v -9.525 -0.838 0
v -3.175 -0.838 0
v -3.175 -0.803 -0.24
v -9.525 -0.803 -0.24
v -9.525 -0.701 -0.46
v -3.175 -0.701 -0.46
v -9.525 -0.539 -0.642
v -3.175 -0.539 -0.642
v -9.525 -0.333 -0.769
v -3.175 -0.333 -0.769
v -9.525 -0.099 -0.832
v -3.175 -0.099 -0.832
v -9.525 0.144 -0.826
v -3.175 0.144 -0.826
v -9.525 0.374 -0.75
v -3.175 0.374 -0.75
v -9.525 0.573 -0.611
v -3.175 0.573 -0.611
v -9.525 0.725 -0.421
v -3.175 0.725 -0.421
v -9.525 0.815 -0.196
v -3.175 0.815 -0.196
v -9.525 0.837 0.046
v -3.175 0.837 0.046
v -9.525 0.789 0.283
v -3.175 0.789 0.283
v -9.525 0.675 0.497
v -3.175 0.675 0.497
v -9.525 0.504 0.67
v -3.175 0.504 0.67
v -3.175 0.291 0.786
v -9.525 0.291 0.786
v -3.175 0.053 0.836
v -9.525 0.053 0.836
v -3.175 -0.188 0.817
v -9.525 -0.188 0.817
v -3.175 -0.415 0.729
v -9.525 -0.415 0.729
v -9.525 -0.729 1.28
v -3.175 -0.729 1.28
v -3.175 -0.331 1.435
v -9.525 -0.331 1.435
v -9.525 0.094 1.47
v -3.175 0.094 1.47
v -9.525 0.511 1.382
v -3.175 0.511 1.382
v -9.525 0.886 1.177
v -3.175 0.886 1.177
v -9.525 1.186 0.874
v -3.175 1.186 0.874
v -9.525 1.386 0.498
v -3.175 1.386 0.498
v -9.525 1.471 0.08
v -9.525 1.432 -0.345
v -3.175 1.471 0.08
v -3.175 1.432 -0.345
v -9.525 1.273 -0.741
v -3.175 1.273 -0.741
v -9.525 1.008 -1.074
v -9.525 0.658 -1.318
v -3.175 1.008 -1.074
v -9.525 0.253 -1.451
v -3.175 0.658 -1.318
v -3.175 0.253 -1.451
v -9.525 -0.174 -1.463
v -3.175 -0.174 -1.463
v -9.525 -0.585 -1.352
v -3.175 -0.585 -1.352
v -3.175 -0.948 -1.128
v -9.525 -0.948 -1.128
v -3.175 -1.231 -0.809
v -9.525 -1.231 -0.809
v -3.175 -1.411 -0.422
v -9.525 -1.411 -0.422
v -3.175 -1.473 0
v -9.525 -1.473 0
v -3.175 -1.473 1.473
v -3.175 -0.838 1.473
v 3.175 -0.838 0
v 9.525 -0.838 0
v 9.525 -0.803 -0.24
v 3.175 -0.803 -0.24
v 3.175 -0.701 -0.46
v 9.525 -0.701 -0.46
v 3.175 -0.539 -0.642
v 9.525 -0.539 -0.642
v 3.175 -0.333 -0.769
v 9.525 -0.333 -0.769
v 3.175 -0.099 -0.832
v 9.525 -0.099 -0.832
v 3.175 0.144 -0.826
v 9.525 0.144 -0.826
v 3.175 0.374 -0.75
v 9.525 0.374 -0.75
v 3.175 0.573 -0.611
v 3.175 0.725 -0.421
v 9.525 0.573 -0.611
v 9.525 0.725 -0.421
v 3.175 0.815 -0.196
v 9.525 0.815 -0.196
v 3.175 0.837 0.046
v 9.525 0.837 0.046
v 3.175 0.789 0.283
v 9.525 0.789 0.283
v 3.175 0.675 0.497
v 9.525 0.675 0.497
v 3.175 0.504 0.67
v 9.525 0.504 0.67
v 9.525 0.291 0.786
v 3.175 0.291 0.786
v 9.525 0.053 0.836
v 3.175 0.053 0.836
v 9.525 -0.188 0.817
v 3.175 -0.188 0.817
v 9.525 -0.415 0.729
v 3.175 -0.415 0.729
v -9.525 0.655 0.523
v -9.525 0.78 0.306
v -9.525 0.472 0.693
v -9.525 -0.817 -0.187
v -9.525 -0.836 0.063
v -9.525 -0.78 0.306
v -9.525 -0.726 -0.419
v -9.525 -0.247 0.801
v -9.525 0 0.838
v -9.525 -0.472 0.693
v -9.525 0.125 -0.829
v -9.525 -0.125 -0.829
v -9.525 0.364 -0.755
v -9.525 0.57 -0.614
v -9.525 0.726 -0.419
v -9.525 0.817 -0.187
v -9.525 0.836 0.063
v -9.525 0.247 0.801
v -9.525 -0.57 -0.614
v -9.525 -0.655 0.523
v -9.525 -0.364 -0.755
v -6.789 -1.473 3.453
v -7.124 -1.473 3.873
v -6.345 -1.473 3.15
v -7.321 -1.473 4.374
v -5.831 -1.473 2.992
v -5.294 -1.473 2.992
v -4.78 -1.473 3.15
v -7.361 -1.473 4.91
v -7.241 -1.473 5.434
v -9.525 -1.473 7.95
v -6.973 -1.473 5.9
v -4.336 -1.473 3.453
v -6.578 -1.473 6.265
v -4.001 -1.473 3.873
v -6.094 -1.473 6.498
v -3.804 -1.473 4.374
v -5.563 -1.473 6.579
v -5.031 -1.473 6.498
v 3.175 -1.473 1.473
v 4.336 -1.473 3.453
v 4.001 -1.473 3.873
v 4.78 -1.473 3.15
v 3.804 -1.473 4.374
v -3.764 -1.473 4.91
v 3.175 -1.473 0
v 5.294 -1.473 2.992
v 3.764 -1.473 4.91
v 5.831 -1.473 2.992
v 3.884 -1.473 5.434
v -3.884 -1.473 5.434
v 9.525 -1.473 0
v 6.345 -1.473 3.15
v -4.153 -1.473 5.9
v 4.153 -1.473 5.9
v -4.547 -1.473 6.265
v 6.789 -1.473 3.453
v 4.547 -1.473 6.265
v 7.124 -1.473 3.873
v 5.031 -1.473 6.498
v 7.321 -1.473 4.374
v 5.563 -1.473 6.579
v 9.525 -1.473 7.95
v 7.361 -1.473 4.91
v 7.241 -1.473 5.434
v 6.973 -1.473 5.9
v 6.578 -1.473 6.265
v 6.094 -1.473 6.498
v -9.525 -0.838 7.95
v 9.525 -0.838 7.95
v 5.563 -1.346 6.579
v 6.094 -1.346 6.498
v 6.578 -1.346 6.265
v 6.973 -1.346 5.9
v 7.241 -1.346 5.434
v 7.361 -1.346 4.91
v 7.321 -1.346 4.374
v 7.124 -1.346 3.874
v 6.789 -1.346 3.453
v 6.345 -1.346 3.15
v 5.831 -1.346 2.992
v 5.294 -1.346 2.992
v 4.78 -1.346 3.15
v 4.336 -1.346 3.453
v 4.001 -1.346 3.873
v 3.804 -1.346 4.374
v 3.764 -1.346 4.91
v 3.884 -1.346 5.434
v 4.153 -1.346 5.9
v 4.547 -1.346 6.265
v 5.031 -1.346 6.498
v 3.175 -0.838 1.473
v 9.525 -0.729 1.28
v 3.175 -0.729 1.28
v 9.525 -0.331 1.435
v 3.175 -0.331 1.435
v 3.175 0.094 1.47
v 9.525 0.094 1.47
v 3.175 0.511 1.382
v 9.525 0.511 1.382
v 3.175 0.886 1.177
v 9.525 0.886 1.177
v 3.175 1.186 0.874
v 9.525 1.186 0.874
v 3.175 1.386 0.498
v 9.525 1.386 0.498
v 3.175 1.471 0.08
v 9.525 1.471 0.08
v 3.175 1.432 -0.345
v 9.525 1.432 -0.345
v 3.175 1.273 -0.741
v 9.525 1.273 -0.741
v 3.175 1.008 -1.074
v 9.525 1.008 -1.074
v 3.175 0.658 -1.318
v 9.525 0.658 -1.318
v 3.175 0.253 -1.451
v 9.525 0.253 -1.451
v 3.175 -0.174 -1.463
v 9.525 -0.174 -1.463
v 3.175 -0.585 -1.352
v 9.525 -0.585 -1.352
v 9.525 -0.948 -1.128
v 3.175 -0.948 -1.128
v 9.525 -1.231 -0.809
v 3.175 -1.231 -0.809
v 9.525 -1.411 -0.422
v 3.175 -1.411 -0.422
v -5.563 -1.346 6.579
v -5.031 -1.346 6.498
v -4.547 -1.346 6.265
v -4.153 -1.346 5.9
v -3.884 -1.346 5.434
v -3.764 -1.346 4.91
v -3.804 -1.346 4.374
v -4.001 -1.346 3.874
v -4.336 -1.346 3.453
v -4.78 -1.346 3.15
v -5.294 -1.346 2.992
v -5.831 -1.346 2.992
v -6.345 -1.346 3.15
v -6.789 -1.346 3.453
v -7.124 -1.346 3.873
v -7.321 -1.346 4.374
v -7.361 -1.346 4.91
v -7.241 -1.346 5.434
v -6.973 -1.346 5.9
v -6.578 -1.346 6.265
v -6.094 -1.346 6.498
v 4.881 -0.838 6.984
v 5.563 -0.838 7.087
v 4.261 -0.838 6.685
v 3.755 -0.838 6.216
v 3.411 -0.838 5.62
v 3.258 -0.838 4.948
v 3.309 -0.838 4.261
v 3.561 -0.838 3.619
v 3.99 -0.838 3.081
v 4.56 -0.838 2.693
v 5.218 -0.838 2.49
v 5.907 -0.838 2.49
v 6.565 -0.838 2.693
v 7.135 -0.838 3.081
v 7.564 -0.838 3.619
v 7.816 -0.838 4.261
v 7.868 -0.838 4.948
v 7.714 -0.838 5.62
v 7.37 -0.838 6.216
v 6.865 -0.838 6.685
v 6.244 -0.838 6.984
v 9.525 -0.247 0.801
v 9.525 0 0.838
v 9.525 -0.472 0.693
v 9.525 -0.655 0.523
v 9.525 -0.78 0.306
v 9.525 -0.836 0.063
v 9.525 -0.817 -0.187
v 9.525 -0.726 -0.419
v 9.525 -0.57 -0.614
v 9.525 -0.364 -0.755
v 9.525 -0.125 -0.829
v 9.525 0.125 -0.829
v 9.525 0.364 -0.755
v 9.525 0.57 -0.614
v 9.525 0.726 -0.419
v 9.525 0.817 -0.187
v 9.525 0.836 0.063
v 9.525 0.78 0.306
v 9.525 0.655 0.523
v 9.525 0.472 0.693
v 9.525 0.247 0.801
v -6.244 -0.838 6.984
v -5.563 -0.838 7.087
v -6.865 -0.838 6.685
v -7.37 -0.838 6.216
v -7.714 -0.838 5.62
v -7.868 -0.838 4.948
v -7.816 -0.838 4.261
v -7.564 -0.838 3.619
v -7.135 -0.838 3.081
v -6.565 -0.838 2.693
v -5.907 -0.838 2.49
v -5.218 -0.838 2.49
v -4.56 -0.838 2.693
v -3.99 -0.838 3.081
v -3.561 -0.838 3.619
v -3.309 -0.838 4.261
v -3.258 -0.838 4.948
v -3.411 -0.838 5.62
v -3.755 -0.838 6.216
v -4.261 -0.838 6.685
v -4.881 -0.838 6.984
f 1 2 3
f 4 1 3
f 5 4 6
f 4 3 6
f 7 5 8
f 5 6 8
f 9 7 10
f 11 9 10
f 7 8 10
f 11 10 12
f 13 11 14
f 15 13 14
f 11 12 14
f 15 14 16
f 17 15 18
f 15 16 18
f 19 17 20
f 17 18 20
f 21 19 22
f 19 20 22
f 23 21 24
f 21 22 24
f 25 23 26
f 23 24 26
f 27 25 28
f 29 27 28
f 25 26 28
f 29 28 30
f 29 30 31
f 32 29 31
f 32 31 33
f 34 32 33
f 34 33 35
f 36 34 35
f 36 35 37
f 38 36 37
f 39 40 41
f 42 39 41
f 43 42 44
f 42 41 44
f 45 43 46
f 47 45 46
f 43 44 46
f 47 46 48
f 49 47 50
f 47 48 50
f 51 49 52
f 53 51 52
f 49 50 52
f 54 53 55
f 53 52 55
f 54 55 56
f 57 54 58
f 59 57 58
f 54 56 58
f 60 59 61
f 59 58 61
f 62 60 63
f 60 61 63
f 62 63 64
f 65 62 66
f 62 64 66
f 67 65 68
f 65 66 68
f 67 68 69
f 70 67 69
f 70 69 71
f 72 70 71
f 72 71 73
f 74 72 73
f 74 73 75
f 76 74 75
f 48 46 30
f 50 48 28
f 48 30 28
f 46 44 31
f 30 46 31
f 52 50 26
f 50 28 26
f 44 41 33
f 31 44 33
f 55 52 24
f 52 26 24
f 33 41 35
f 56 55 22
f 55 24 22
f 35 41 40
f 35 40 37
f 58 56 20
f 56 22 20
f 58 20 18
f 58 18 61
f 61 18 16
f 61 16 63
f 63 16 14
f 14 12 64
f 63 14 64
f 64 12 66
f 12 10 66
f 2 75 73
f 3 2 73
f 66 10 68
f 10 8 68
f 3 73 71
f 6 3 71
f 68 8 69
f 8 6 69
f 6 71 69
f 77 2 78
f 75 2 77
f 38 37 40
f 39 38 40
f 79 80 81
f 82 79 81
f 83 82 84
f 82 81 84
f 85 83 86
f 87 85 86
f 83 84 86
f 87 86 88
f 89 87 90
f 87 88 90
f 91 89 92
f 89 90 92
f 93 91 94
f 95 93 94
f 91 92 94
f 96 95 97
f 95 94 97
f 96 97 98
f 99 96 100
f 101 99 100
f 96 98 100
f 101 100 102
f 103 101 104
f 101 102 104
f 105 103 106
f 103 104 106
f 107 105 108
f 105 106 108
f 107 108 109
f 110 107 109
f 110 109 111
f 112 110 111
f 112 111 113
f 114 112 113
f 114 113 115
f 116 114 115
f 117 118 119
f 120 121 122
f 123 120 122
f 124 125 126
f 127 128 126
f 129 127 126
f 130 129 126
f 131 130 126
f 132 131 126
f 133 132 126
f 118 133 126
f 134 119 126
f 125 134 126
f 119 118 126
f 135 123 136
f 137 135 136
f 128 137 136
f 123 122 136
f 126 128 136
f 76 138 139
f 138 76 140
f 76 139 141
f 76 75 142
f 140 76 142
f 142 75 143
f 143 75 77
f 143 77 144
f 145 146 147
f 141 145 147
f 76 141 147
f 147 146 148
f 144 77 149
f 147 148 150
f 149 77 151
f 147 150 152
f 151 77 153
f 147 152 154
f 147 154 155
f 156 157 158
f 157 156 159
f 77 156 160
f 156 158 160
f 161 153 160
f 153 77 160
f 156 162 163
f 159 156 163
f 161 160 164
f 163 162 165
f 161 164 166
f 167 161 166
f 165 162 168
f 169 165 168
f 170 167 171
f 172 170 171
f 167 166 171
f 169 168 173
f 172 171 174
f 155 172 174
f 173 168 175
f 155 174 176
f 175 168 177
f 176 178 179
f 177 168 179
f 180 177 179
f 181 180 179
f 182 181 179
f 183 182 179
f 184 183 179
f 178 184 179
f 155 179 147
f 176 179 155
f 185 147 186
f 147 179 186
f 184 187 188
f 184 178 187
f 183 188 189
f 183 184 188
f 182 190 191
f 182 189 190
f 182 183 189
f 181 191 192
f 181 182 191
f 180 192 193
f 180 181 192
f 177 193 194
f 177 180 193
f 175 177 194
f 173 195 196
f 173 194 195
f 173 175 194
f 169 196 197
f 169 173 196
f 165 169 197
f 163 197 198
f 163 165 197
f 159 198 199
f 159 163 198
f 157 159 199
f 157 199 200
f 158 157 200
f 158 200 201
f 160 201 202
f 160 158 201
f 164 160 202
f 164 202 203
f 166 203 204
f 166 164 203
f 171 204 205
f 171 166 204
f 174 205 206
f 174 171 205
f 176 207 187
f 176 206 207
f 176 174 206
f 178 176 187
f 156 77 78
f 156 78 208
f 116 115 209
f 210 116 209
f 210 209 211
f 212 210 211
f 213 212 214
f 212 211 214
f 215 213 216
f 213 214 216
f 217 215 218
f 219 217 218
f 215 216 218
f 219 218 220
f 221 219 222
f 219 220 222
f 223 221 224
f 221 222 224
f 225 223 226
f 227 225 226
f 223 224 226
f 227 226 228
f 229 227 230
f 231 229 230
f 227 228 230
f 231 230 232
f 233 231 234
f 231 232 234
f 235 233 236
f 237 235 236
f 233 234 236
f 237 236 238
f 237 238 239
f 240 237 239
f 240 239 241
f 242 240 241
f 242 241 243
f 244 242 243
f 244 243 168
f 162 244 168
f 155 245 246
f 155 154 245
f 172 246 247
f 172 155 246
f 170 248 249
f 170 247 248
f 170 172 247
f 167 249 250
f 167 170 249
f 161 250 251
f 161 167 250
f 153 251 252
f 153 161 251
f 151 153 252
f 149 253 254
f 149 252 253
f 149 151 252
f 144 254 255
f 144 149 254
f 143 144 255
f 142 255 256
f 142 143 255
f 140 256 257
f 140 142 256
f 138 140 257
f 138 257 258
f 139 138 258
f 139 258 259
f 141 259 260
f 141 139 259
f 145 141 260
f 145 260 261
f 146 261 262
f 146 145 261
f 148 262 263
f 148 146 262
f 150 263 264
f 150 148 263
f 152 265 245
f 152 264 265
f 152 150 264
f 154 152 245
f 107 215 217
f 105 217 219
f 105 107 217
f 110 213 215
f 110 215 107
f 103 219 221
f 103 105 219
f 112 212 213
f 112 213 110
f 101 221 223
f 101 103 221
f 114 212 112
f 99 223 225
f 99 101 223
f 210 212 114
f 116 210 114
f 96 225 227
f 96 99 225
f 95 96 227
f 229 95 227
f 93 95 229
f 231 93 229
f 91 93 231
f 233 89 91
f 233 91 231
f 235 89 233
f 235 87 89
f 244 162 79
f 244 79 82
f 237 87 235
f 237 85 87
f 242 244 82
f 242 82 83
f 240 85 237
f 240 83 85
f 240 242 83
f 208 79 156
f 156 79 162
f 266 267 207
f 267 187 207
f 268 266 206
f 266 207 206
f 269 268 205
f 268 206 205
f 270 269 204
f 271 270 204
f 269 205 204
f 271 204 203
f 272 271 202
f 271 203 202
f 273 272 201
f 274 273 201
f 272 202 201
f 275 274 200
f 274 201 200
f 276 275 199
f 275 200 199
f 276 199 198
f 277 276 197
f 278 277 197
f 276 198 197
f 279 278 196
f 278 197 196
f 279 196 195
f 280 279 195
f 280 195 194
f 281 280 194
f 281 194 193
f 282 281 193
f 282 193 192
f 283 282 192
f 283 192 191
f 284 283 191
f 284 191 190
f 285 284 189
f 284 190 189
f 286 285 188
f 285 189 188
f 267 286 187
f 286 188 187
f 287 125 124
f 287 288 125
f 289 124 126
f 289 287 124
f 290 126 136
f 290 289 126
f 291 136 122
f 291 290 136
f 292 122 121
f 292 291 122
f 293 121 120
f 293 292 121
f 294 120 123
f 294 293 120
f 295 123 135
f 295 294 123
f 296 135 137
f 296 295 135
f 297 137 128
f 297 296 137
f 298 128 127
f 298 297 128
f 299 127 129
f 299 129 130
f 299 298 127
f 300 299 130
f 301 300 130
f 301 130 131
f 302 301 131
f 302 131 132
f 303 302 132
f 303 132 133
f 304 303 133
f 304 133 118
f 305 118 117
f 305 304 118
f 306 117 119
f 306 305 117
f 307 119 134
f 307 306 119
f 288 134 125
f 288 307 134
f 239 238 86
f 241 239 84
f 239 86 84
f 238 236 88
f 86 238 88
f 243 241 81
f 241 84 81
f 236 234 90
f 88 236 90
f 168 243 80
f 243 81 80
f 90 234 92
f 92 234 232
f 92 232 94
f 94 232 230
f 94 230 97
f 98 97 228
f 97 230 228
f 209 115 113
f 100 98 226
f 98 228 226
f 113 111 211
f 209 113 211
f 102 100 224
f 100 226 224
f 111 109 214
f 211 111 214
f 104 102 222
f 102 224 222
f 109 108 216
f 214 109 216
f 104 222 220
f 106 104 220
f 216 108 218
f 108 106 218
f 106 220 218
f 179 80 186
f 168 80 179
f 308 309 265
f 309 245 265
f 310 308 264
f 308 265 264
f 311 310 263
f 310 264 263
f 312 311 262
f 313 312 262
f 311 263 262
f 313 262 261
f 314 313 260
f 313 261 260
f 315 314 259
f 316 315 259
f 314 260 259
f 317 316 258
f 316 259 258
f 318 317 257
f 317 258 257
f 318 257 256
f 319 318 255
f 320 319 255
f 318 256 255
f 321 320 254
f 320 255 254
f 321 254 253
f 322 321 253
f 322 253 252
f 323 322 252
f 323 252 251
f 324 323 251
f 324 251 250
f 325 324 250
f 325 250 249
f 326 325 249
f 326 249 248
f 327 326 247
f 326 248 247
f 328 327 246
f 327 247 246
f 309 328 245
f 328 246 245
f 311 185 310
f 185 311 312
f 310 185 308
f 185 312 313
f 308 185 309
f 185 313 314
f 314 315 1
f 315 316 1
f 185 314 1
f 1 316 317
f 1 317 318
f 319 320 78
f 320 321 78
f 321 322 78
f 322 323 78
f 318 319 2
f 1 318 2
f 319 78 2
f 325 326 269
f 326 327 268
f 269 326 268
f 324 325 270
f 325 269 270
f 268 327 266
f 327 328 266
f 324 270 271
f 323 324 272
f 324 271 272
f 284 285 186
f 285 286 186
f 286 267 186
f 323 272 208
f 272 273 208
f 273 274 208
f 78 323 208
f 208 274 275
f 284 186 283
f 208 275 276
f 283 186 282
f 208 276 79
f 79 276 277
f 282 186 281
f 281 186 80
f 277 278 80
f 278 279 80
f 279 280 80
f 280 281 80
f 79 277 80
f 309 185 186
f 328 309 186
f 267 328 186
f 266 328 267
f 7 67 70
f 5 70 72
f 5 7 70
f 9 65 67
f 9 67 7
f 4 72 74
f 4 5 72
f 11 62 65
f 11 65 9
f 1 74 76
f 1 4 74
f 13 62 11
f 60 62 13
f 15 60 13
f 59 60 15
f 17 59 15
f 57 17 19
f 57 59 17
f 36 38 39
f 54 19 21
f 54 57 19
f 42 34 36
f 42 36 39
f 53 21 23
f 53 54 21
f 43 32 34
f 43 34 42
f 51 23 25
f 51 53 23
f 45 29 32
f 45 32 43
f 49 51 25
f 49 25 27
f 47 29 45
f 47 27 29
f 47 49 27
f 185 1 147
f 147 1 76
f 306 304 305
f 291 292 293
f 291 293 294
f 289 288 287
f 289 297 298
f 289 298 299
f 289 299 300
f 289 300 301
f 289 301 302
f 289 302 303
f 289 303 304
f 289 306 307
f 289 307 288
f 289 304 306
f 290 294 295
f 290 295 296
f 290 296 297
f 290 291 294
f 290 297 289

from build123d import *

# Parameters (mm, degrees)
BOSS_EXTRUDE1_DEPTH     = 9.525
CUT_EXTRUDE1_DEPTH      = 13.494063522
CUT_EXTRUDE1_DEPTH_BACK = 13.494063522
SKETCH4_W               = 6.35
SKETCH4_H               = 2.9464
CUT_EXTRUDE3_DEPTH      = 13.494063522
CUT_EXTRUDE3_DEPTH_BACK = 13.494063522
SKETCH9_R               = 1.8034
SKETCH6_R               = 0.8382
BOSS_EXTRUDE2_DEPTH     = 9.525


with BuildPart() as part:
    # Sketch3 → Boss-Extrude1 (new, symmetric)
    with BuildSketch(Plane(origin=(0, 0, 0), x_dir=(0, 0, -1), z_dir=(1, 0, 0))):
        with BuildLine():
            Line((0, -1.4732), (-7.9502, -1.4732))
            Line((-7.9502, -1.4732), (-7.9502, -0.8382))
            Line((-7.9502, -0.8382), (0, -0.8382))
            ThreePointArc((0, -0.8382), (0.421388638, 0.724576328), (-0.728533124, -0.414510226))
            Line((-0.728533124, -0.414510226), (-1.280452157, -0.728533124))
            ThreePointArc((-1.280452157, -0.728533124), (0.740622455, 1.273497789), (0, -1.4732))
        make_face()
    extrude(amount=BOSS_EXTRUDE1_DEPTH, both=True)

    # Sketch4 → Cut-Extrude1 (cut, two sides: drawn at the far end of the back side and taken through both)
    with BuildSketch(Plane(origin=(0, 0, 0), x_dir=(1, 0, 0), z_dir=(0, 1, 0)).offset(-CUT_EXTRUDE1_DEPTH_BACK)):
        Rectangle(SKETCH4_W, SKETCH4_H)
    extrude(amount=CUT_EXTRUDE1_DEPTH + CUT_EXTRUDE1_DEPTH_BACK, mode=Mode.SUBTRACT)

    # Cut-Extrude2 cone 1 section (through the dimple's axis) → Cut-Extrude2 (revolve, cut)
    with BuildSketch(Plane(origin=(5.5626, -0.8382, 4.7752), x_dir=(0, 0, 1), z_dir=(1, 0, 0))):
        Polygon((0, 0), (2.3114, 0), (0, 2.3114), align=None)
    revolve(axis=Axis((5.5626, -0.8382, 4.7752), (0, -1, 0)), mode=Mode.SUBTRACT)

    # Cut-Extrude2 cone 2 section (through the dimple's axis) → Cut-Extrude2 cone 2 (revolve, cut)
    with BuildSketch(Plane(origin=(-5.5626, -0.8382, 4.7752), x_dir=(0, 0, 1), z_dir=(1, 0, 0))):
        Polygon((0, 0), (2.3114, 0), (0, 2.3114), align=None)
    revolve(axis=Axis((-5.5626, -0.8382, 4.7752), (0, -1, 0)), mode=Mode.SUBTRACT)

    # Sketch9 → Cut-Extrude3 (cut, two sides: drawn at the far end of the back side and taken through both)
    with BuildSketch(Plane(origin=(0, 0, 0), x_dir=(1, 0, 0), z_dir=(0, 1, 0)).offset(-CUT_EXTRUDE3_DEPTH_BACK)):
        with Locations(Location((5.5626, -4.7752, 0), (0, 0, 270))):
            Circle(SKETCH9_R)
        with Locations(Location((-5.5626, -4.7752, 0), (0, 0, 270))):
            Circle(SKETCH9_R)
    extrude(amount=CUT_EXTRUDE3_DEPTH + CUT_EXTRUDE3_DEPTH_BACK, mode=Mode.SUBTRACT)


with BuildPart() as body_2:
    # Sketch6 → Boss-Extrude2 (new, symmetric)
    with BuildSketch(Plane(origin=(0, 0, 0), x_dir=(0, 0, -1), z_dir=(1, 0, 0))):
        with Locations(Location((0, 0, 0), (0, 0, 180))):
            Circle(SKETCH6_R)
    extrude(amount=BOSS_EXTRUDE2_DEPTH, both=True)


solid = Compound([part.part, body_2.part])
